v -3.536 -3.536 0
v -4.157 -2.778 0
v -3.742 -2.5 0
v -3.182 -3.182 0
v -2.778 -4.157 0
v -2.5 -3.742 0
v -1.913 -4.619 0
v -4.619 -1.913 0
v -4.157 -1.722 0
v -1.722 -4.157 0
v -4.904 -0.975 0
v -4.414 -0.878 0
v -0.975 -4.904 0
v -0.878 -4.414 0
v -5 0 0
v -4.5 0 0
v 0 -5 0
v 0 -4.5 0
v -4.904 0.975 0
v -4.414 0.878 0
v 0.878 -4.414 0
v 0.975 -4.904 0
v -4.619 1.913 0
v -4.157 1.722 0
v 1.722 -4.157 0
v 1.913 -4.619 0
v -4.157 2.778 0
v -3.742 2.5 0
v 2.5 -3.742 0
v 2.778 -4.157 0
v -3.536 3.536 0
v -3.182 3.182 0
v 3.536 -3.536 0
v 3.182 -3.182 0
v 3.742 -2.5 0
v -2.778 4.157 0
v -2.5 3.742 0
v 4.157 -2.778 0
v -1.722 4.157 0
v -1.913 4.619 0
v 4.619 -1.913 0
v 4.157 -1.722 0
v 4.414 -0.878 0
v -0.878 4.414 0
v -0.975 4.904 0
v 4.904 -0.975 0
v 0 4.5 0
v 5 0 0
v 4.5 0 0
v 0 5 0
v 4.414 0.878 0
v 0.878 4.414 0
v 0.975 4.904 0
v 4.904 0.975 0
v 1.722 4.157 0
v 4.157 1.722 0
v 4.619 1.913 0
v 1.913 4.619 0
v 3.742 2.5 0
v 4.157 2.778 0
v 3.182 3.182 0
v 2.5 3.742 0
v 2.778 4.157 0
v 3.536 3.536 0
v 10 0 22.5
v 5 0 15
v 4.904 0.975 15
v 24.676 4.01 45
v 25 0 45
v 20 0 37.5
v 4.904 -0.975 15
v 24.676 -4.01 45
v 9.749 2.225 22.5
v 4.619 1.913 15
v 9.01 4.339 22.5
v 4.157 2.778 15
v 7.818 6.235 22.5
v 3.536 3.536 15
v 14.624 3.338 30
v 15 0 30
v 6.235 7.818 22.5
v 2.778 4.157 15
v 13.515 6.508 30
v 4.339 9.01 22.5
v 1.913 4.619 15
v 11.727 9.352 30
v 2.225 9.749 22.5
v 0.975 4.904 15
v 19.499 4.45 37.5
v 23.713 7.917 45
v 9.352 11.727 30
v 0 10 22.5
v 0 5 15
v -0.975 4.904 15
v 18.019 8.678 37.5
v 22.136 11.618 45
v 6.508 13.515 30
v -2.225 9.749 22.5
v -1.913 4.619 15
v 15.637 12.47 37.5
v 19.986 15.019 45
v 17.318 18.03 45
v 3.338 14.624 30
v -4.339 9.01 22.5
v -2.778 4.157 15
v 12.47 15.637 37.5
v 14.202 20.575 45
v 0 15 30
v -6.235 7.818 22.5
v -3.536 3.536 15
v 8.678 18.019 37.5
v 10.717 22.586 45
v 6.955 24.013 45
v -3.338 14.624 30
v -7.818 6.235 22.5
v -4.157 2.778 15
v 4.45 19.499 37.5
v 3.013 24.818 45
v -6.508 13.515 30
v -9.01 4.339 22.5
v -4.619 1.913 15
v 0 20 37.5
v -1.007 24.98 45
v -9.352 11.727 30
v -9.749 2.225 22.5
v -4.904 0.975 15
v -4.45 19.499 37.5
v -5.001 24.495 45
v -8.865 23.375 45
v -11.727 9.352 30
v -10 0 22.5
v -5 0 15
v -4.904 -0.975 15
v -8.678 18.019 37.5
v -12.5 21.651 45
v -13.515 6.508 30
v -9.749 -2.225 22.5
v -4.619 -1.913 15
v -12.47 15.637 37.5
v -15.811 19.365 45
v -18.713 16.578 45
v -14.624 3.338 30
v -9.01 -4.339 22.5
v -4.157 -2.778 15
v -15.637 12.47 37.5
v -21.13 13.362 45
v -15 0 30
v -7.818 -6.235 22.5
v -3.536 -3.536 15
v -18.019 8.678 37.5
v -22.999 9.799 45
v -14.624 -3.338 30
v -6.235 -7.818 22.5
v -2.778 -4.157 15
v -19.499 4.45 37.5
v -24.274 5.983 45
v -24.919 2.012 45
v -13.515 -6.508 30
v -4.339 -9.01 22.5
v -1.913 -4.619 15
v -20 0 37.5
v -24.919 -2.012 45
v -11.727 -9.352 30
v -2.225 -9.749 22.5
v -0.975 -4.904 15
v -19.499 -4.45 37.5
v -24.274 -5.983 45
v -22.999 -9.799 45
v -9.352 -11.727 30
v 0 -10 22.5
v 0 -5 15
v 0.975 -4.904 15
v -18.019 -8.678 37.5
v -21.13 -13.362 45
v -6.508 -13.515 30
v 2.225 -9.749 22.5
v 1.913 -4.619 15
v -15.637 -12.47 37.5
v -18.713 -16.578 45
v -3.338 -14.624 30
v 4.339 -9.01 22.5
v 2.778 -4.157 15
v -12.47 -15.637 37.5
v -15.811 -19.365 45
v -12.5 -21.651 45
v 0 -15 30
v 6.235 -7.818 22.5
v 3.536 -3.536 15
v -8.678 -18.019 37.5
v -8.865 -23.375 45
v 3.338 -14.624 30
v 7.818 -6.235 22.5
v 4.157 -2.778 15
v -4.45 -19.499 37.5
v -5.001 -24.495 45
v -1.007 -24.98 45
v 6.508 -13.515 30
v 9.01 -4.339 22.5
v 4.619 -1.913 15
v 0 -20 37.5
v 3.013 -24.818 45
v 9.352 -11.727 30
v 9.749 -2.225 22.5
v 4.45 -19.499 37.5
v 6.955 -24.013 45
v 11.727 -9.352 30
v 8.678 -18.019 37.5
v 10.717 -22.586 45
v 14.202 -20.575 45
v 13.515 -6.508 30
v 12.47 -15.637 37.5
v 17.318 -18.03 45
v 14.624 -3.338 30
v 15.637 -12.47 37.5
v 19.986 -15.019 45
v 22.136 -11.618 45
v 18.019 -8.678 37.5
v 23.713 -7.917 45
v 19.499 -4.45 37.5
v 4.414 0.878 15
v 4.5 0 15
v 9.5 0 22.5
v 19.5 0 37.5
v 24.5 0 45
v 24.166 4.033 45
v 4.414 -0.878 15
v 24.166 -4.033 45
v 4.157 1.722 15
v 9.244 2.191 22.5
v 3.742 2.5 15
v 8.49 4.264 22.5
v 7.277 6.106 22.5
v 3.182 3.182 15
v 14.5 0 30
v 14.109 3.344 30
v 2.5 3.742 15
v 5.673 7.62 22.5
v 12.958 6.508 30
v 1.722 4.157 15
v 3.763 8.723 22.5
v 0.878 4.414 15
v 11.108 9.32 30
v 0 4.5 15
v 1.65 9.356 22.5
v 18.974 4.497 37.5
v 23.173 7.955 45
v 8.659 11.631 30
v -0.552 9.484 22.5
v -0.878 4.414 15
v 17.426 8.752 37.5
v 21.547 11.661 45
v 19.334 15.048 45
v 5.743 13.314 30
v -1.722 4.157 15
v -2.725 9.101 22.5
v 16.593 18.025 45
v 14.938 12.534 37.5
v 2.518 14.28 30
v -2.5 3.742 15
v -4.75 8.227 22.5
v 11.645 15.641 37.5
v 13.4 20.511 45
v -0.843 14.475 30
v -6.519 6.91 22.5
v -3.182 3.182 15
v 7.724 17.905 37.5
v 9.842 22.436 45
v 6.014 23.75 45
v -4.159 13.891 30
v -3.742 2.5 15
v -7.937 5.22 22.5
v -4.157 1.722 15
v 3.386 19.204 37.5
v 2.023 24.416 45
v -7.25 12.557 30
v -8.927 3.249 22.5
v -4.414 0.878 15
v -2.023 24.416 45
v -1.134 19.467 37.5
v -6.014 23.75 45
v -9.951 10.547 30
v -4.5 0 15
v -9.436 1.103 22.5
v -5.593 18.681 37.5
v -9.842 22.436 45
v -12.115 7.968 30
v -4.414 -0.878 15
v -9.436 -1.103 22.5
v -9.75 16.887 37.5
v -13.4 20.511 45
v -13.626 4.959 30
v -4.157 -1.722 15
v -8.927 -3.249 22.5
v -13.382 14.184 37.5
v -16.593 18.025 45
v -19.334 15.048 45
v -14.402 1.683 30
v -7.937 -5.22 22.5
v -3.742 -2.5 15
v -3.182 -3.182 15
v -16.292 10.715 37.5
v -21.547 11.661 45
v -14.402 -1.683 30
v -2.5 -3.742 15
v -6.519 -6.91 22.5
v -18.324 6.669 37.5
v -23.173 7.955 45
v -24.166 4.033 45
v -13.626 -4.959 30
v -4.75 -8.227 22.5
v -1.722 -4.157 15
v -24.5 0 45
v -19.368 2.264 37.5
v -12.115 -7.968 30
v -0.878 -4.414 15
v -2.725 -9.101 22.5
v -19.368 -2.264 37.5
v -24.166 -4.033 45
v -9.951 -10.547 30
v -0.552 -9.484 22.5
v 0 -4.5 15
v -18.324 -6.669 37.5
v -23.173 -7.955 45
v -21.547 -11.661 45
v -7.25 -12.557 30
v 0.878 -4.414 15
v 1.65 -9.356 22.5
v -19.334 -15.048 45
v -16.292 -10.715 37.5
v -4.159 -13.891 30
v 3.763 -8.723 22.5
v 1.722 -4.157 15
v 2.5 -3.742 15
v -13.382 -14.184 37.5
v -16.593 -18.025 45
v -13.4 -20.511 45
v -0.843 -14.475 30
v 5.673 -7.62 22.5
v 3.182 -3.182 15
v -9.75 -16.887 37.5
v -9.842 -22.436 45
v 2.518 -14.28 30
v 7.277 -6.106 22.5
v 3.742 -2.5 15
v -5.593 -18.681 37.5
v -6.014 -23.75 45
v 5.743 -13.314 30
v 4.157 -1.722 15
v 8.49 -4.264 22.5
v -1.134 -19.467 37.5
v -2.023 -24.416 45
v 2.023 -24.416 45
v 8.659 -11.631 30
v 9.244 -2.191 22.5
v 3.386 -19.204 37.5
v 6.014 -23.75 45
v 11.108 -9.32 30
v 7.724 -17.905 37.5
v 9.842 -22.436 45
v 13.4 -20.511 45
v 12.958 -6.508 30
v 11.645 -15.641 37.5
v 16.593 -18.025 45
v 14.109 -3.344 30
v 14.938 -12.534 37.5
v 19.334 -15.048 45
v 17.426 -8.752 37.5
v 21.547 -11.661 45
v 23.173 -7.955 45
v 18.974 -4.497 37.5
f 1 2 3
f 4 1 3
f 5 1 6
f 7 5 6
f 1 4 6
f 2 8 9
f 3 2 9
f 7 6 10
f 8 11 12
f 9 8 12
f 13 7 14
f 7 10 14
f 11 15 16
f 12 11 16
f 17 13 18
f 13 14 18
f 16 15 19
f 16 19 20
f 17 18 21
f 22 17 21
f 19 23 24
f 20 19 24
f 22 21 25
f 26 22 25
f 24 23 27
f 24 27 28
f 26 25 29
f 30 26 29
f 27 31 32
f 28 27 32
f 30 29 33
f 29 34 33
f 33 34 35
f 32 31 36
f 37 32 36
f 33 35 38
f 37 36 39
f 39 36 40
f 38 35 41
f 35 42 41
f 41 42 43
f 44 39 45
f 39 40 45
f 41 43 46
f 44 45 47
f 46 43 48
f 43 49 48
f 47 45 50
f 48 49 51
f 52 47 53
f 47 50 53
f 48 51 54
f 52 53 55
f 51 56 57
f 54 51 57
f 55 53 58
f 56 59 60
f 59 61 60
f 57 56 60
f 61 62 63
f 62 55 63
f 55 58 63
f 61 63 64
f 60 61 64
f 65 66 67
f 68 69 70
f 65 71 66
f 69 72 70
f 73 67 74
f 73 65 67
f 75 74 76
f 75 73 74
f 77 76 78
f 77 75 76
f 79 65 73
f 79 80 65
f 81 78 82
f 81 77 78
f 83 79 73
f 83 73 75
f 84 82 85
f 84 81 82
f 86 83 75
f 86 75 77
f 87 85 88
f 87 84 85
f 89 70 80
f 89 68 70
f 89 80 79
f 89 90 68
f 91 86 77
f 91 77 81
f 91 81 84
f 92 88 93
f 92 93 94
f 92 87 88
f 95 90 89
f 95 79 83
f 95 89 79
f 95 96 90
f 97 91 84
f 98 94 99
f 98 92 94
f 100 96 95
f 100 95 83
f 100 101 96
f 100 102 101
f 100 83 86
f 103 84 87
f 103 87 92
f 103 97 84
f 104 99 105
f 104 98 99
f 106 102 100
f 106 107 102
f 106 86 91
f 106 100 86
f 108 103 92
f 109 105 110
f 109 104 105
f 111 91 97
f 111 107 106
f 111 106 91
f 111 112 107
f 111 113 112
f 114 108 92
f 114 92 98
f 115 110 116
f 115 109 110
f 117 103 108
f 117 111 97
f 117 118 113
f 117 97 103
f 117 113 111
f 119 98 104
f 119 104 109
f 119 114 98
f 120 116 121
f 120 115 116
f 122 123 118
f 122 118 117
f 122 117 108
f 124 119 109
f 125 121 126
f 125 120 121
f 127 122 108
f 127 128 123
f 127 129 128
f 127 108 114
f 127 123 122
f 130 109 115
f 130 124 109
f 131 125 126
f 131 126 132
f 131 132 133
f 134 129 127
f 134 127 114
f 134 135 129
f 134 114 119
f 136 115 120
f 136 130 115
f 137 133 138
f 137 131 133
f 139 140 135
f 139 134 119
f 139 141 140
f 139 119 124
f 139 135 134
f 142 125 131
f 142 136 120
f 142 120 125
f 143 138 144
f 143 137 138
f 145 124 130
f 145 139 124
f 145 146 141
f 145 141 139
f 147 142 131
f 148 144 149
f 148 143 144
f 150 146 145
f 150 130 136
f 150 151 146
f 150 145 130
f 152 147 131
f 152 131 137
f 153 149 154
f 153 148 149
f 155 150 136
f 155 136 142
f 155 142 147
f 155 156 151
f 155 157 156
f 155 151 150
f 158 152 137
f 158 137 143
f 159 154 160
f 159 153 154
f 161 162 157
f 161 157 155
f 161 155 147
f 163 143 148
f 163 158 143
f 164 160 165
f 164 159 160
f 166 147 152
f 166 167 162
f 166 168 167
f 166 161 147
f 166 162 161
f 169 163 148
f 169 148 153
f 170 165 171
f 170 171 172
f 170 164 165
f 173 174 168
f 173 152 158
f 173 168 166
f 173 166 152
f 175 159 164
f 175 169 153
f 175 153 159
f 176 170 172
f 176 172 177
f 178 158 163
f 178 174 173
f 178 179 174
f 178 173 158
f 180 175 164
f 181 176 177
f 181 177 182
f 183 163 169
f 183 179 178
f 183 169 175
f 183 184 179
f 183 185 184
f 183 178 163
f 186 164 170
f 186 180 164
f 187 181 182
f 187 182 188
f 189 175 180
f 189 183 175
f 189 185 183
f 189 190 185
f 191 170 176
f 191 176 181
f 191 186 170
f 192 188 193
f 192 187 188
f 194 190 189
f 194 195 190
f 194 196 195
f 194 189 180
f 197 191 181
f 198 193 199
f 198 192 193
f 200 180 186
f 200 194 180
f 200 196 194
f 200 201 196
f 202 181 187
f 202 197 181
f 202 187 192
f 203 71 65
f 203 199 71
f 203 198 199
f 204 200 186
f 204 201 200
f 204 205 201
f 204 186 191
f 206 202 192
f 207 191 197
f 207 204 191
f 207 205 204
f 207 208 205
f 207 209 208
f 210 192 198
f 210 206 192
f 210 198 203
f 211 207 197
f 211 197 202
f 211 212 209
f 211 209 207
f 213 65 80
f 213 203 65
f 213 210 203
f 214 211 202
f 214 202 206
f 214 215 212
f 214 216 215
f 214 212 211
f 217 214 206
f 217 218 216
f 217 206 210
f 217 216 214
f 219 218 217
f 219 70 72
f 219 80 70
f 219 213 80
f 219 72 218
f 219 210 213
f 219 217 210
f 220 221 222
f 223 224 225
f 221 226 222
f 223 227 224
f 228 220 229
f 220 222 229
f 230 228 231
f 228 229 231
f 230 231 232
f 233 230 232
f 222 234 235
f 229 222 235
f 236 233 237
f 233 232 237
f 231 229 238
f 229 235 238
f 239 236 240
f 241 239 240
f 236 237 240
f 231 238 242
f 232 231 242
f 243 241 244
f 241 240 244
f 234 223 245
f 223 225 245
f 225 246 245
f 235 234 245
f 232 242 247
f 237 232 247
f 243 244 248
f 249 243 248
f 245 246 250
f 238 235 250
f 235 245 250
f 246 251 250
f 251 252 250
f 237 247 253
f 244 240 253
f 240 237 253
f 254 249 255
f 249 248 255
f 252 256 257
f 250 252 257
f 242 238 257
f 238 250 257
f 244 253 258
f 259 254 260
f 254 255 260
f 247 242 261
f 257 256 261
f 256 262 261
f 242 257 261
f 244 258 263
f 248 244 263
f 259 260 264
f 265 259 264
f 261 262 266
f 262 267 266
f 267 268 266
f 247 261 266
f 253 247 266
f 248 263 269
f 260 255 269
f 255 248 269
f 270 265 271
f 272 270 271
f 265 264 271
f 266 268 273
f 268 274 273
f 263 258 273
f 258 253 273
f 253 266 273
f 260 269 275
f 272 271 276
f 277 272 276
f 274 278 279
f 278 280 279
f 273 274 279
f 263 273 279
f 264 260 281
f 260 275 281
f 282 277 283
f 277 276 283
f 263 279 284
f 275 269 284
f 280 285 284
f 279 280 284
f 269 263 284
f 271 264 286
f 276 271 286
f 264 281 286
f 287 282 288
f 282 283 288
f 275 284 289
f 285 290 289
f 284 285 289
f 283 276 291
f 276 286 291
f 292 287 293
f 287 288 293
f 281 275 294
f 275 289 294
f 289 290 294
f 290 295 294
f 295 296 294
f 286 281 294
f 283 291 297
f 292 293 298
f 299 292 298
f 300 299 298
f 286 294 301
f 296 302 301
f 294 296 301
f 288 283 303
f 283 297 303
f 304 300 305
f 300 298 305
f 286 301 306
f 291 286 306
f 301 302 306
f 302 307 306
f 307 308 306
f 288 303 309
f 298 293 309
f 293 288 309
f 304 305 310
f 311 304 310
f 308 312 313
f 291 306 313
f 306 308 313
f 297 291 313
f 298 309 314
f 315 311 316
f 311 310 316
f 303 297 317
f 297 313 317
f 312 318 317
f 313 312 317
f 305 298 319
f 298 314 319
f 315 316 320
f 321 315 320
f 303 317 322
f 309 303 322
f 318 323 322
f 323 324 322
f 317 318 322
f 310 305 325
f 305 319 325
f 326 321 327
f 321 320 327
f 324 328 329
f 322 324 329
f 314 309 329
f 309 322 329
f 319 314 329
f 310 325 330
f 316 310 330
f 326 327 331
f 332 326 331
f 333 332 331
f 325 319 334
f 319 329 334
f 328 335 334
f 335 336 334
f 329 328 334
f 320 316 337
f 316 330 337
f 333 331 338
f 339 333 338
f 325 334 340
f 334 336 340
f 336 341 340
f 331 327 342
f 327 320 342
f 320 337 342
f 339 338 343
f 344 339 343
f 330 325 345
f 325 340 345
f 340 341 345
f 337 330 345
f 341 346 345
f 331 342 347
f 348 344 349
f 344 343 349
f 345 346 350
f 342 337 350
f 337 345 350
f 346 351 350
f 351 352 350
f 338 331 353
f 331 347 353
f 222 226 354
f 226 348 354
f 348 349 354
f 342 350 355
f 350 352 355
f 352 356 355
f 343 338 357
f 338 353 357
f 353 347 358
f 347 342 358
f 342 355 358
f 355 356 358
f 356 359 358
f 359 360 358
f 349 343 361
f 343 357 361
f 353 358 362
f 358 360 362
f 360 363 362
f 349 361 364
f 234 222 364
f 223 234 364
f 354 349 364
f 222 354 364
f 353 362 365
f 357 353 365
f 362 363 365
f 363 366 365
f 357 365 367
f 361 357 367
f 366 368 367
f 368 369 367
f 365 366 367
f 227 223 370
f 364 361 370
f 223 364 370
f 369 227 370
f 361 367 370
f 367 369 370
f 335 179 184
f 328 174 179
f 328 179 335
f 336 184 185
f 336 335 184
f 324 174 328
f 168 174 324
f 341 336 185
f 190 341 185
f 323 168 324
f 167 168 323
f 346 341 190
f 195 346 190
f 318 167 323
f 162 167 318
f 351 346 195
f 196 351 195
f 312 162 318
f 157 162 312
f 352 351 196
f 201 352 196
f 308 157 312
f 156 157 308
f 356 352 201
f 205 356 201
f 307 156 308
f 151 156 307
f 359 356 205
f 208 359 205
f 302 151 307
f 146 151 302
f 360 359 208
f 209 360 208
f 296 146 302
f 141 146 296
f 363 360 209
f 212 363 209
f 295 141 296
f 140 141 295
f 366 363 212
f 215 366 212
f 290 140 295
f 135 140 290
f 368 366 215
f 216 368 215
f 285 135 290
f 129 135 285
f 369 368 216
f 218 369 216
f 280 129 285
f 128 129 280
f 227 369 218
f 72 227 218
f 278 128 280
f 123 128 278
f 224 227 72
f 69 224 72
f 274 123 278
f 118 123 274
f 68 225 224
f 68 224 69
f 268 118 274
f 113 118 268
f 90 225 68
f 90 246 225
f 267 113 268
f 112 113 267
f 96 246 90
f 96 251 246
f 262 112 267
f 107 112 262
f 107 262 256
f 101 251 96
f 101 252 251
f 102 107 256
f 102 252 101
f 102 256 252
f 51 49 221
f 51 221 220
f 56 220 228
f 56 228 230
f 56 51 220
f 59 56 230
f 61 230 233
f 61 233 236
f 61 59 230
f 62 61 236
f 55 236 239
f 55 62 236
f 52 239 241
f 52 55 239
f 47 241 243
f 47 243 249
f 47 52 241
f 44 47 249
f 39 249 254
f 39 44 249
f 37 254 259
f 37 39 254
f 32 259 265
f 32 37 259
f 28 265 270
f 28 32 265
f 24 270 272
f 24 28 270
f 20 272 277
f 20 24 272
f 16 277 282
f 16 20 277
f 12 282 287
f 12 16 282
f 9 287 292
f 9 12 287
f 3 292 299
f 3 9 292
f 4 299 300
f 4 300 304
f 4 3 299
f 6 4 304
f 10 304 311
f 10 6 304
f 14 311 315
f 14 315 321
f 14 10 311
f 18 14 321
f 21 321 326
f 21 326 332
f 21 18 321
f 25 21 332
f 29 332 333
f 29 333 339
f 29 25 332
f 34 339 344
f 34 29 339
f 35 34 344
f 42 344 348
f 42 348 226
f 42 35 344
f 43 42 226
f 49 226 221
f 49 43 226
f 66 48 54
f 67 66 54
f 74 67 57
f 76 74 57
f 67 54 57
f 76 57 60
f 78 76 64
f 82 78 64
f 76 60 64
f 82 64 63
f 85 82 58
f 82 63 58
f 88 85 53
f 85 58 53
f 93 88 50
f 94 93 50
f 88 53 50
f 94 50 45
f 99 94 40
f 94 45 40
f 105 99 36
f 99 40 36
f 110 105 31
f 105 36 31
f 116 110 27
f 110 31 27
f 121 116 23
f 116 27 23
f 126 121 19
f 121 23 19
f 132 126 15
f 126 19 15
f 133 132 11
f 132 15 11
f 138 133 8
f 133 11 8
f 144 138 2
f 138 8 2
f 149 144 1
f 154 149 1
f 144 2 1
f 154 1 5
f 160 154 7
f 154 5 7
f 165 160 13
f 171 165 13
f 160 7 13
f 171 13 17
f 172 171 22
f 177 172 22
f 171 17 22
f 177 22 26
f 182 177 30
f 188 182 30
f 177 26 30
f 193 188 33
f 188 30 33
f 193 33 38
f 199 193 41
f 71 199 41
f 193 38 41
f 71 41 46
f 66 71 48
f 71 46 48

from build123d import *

# Parameters (mm, degrees)
CYLINDER001_R     = 4.5
CYLINDER001_DEPTH = 15
CYLINDER_R        = 5
CYLINDER_DEPTH    = 15


with BuildPart() as cilindro_interno:
    # Cylinder001 → Cylinder001 (new body)
    with BuildSketch(Plane.XY):
        Circle(CYLINDER001_R)
    extrude(amount=CYLINDER001_DEPTH)


with BuildPart() as cilindro:
    # Cylinder → Cylinder (new body)
    with BuildSketch(Plane.XY):
        Circle(CYLINDER_R)
    extrude(amount=CYLINDER_DEPTH)

    # Cut: cut cilindro_interno
    add(cilindro_interno.part, mode=Mode.SUBTRACT)


with BuildPart() as cono_interior:
    # Cone001 → Cone001 (revolve)
    with BuildSketch(Plane.XZ):
        Polygon((0, 0), (4.5, 0), (24.5, 30), (0, 30), align=None)
    revolve(axis=Axis((0, 0, 0), (0, 0, 1)))


with BuildPart() as fonil:
    # Cone → Cone (revolve)
    with BuildSketch(Plane.XZ):
        Polygon((0, 0), (5, 0), (25, 30), (0, 30), align=None)
    revolve(axis=Axis((0, 0, 0), (0, 0, 1)))

    # Cut001: cut cono_interior
    add(cono_interior.part, mode=Mode.SUBTRACT)


with BuildPart() as fonil_1:
    # Cut001 placement: moved
    add(fonil.part.moved(Location((0, 0, 15))))

    # Fusion: union cilindro
    add(cilindro.part)


solid = fonil_1.part
